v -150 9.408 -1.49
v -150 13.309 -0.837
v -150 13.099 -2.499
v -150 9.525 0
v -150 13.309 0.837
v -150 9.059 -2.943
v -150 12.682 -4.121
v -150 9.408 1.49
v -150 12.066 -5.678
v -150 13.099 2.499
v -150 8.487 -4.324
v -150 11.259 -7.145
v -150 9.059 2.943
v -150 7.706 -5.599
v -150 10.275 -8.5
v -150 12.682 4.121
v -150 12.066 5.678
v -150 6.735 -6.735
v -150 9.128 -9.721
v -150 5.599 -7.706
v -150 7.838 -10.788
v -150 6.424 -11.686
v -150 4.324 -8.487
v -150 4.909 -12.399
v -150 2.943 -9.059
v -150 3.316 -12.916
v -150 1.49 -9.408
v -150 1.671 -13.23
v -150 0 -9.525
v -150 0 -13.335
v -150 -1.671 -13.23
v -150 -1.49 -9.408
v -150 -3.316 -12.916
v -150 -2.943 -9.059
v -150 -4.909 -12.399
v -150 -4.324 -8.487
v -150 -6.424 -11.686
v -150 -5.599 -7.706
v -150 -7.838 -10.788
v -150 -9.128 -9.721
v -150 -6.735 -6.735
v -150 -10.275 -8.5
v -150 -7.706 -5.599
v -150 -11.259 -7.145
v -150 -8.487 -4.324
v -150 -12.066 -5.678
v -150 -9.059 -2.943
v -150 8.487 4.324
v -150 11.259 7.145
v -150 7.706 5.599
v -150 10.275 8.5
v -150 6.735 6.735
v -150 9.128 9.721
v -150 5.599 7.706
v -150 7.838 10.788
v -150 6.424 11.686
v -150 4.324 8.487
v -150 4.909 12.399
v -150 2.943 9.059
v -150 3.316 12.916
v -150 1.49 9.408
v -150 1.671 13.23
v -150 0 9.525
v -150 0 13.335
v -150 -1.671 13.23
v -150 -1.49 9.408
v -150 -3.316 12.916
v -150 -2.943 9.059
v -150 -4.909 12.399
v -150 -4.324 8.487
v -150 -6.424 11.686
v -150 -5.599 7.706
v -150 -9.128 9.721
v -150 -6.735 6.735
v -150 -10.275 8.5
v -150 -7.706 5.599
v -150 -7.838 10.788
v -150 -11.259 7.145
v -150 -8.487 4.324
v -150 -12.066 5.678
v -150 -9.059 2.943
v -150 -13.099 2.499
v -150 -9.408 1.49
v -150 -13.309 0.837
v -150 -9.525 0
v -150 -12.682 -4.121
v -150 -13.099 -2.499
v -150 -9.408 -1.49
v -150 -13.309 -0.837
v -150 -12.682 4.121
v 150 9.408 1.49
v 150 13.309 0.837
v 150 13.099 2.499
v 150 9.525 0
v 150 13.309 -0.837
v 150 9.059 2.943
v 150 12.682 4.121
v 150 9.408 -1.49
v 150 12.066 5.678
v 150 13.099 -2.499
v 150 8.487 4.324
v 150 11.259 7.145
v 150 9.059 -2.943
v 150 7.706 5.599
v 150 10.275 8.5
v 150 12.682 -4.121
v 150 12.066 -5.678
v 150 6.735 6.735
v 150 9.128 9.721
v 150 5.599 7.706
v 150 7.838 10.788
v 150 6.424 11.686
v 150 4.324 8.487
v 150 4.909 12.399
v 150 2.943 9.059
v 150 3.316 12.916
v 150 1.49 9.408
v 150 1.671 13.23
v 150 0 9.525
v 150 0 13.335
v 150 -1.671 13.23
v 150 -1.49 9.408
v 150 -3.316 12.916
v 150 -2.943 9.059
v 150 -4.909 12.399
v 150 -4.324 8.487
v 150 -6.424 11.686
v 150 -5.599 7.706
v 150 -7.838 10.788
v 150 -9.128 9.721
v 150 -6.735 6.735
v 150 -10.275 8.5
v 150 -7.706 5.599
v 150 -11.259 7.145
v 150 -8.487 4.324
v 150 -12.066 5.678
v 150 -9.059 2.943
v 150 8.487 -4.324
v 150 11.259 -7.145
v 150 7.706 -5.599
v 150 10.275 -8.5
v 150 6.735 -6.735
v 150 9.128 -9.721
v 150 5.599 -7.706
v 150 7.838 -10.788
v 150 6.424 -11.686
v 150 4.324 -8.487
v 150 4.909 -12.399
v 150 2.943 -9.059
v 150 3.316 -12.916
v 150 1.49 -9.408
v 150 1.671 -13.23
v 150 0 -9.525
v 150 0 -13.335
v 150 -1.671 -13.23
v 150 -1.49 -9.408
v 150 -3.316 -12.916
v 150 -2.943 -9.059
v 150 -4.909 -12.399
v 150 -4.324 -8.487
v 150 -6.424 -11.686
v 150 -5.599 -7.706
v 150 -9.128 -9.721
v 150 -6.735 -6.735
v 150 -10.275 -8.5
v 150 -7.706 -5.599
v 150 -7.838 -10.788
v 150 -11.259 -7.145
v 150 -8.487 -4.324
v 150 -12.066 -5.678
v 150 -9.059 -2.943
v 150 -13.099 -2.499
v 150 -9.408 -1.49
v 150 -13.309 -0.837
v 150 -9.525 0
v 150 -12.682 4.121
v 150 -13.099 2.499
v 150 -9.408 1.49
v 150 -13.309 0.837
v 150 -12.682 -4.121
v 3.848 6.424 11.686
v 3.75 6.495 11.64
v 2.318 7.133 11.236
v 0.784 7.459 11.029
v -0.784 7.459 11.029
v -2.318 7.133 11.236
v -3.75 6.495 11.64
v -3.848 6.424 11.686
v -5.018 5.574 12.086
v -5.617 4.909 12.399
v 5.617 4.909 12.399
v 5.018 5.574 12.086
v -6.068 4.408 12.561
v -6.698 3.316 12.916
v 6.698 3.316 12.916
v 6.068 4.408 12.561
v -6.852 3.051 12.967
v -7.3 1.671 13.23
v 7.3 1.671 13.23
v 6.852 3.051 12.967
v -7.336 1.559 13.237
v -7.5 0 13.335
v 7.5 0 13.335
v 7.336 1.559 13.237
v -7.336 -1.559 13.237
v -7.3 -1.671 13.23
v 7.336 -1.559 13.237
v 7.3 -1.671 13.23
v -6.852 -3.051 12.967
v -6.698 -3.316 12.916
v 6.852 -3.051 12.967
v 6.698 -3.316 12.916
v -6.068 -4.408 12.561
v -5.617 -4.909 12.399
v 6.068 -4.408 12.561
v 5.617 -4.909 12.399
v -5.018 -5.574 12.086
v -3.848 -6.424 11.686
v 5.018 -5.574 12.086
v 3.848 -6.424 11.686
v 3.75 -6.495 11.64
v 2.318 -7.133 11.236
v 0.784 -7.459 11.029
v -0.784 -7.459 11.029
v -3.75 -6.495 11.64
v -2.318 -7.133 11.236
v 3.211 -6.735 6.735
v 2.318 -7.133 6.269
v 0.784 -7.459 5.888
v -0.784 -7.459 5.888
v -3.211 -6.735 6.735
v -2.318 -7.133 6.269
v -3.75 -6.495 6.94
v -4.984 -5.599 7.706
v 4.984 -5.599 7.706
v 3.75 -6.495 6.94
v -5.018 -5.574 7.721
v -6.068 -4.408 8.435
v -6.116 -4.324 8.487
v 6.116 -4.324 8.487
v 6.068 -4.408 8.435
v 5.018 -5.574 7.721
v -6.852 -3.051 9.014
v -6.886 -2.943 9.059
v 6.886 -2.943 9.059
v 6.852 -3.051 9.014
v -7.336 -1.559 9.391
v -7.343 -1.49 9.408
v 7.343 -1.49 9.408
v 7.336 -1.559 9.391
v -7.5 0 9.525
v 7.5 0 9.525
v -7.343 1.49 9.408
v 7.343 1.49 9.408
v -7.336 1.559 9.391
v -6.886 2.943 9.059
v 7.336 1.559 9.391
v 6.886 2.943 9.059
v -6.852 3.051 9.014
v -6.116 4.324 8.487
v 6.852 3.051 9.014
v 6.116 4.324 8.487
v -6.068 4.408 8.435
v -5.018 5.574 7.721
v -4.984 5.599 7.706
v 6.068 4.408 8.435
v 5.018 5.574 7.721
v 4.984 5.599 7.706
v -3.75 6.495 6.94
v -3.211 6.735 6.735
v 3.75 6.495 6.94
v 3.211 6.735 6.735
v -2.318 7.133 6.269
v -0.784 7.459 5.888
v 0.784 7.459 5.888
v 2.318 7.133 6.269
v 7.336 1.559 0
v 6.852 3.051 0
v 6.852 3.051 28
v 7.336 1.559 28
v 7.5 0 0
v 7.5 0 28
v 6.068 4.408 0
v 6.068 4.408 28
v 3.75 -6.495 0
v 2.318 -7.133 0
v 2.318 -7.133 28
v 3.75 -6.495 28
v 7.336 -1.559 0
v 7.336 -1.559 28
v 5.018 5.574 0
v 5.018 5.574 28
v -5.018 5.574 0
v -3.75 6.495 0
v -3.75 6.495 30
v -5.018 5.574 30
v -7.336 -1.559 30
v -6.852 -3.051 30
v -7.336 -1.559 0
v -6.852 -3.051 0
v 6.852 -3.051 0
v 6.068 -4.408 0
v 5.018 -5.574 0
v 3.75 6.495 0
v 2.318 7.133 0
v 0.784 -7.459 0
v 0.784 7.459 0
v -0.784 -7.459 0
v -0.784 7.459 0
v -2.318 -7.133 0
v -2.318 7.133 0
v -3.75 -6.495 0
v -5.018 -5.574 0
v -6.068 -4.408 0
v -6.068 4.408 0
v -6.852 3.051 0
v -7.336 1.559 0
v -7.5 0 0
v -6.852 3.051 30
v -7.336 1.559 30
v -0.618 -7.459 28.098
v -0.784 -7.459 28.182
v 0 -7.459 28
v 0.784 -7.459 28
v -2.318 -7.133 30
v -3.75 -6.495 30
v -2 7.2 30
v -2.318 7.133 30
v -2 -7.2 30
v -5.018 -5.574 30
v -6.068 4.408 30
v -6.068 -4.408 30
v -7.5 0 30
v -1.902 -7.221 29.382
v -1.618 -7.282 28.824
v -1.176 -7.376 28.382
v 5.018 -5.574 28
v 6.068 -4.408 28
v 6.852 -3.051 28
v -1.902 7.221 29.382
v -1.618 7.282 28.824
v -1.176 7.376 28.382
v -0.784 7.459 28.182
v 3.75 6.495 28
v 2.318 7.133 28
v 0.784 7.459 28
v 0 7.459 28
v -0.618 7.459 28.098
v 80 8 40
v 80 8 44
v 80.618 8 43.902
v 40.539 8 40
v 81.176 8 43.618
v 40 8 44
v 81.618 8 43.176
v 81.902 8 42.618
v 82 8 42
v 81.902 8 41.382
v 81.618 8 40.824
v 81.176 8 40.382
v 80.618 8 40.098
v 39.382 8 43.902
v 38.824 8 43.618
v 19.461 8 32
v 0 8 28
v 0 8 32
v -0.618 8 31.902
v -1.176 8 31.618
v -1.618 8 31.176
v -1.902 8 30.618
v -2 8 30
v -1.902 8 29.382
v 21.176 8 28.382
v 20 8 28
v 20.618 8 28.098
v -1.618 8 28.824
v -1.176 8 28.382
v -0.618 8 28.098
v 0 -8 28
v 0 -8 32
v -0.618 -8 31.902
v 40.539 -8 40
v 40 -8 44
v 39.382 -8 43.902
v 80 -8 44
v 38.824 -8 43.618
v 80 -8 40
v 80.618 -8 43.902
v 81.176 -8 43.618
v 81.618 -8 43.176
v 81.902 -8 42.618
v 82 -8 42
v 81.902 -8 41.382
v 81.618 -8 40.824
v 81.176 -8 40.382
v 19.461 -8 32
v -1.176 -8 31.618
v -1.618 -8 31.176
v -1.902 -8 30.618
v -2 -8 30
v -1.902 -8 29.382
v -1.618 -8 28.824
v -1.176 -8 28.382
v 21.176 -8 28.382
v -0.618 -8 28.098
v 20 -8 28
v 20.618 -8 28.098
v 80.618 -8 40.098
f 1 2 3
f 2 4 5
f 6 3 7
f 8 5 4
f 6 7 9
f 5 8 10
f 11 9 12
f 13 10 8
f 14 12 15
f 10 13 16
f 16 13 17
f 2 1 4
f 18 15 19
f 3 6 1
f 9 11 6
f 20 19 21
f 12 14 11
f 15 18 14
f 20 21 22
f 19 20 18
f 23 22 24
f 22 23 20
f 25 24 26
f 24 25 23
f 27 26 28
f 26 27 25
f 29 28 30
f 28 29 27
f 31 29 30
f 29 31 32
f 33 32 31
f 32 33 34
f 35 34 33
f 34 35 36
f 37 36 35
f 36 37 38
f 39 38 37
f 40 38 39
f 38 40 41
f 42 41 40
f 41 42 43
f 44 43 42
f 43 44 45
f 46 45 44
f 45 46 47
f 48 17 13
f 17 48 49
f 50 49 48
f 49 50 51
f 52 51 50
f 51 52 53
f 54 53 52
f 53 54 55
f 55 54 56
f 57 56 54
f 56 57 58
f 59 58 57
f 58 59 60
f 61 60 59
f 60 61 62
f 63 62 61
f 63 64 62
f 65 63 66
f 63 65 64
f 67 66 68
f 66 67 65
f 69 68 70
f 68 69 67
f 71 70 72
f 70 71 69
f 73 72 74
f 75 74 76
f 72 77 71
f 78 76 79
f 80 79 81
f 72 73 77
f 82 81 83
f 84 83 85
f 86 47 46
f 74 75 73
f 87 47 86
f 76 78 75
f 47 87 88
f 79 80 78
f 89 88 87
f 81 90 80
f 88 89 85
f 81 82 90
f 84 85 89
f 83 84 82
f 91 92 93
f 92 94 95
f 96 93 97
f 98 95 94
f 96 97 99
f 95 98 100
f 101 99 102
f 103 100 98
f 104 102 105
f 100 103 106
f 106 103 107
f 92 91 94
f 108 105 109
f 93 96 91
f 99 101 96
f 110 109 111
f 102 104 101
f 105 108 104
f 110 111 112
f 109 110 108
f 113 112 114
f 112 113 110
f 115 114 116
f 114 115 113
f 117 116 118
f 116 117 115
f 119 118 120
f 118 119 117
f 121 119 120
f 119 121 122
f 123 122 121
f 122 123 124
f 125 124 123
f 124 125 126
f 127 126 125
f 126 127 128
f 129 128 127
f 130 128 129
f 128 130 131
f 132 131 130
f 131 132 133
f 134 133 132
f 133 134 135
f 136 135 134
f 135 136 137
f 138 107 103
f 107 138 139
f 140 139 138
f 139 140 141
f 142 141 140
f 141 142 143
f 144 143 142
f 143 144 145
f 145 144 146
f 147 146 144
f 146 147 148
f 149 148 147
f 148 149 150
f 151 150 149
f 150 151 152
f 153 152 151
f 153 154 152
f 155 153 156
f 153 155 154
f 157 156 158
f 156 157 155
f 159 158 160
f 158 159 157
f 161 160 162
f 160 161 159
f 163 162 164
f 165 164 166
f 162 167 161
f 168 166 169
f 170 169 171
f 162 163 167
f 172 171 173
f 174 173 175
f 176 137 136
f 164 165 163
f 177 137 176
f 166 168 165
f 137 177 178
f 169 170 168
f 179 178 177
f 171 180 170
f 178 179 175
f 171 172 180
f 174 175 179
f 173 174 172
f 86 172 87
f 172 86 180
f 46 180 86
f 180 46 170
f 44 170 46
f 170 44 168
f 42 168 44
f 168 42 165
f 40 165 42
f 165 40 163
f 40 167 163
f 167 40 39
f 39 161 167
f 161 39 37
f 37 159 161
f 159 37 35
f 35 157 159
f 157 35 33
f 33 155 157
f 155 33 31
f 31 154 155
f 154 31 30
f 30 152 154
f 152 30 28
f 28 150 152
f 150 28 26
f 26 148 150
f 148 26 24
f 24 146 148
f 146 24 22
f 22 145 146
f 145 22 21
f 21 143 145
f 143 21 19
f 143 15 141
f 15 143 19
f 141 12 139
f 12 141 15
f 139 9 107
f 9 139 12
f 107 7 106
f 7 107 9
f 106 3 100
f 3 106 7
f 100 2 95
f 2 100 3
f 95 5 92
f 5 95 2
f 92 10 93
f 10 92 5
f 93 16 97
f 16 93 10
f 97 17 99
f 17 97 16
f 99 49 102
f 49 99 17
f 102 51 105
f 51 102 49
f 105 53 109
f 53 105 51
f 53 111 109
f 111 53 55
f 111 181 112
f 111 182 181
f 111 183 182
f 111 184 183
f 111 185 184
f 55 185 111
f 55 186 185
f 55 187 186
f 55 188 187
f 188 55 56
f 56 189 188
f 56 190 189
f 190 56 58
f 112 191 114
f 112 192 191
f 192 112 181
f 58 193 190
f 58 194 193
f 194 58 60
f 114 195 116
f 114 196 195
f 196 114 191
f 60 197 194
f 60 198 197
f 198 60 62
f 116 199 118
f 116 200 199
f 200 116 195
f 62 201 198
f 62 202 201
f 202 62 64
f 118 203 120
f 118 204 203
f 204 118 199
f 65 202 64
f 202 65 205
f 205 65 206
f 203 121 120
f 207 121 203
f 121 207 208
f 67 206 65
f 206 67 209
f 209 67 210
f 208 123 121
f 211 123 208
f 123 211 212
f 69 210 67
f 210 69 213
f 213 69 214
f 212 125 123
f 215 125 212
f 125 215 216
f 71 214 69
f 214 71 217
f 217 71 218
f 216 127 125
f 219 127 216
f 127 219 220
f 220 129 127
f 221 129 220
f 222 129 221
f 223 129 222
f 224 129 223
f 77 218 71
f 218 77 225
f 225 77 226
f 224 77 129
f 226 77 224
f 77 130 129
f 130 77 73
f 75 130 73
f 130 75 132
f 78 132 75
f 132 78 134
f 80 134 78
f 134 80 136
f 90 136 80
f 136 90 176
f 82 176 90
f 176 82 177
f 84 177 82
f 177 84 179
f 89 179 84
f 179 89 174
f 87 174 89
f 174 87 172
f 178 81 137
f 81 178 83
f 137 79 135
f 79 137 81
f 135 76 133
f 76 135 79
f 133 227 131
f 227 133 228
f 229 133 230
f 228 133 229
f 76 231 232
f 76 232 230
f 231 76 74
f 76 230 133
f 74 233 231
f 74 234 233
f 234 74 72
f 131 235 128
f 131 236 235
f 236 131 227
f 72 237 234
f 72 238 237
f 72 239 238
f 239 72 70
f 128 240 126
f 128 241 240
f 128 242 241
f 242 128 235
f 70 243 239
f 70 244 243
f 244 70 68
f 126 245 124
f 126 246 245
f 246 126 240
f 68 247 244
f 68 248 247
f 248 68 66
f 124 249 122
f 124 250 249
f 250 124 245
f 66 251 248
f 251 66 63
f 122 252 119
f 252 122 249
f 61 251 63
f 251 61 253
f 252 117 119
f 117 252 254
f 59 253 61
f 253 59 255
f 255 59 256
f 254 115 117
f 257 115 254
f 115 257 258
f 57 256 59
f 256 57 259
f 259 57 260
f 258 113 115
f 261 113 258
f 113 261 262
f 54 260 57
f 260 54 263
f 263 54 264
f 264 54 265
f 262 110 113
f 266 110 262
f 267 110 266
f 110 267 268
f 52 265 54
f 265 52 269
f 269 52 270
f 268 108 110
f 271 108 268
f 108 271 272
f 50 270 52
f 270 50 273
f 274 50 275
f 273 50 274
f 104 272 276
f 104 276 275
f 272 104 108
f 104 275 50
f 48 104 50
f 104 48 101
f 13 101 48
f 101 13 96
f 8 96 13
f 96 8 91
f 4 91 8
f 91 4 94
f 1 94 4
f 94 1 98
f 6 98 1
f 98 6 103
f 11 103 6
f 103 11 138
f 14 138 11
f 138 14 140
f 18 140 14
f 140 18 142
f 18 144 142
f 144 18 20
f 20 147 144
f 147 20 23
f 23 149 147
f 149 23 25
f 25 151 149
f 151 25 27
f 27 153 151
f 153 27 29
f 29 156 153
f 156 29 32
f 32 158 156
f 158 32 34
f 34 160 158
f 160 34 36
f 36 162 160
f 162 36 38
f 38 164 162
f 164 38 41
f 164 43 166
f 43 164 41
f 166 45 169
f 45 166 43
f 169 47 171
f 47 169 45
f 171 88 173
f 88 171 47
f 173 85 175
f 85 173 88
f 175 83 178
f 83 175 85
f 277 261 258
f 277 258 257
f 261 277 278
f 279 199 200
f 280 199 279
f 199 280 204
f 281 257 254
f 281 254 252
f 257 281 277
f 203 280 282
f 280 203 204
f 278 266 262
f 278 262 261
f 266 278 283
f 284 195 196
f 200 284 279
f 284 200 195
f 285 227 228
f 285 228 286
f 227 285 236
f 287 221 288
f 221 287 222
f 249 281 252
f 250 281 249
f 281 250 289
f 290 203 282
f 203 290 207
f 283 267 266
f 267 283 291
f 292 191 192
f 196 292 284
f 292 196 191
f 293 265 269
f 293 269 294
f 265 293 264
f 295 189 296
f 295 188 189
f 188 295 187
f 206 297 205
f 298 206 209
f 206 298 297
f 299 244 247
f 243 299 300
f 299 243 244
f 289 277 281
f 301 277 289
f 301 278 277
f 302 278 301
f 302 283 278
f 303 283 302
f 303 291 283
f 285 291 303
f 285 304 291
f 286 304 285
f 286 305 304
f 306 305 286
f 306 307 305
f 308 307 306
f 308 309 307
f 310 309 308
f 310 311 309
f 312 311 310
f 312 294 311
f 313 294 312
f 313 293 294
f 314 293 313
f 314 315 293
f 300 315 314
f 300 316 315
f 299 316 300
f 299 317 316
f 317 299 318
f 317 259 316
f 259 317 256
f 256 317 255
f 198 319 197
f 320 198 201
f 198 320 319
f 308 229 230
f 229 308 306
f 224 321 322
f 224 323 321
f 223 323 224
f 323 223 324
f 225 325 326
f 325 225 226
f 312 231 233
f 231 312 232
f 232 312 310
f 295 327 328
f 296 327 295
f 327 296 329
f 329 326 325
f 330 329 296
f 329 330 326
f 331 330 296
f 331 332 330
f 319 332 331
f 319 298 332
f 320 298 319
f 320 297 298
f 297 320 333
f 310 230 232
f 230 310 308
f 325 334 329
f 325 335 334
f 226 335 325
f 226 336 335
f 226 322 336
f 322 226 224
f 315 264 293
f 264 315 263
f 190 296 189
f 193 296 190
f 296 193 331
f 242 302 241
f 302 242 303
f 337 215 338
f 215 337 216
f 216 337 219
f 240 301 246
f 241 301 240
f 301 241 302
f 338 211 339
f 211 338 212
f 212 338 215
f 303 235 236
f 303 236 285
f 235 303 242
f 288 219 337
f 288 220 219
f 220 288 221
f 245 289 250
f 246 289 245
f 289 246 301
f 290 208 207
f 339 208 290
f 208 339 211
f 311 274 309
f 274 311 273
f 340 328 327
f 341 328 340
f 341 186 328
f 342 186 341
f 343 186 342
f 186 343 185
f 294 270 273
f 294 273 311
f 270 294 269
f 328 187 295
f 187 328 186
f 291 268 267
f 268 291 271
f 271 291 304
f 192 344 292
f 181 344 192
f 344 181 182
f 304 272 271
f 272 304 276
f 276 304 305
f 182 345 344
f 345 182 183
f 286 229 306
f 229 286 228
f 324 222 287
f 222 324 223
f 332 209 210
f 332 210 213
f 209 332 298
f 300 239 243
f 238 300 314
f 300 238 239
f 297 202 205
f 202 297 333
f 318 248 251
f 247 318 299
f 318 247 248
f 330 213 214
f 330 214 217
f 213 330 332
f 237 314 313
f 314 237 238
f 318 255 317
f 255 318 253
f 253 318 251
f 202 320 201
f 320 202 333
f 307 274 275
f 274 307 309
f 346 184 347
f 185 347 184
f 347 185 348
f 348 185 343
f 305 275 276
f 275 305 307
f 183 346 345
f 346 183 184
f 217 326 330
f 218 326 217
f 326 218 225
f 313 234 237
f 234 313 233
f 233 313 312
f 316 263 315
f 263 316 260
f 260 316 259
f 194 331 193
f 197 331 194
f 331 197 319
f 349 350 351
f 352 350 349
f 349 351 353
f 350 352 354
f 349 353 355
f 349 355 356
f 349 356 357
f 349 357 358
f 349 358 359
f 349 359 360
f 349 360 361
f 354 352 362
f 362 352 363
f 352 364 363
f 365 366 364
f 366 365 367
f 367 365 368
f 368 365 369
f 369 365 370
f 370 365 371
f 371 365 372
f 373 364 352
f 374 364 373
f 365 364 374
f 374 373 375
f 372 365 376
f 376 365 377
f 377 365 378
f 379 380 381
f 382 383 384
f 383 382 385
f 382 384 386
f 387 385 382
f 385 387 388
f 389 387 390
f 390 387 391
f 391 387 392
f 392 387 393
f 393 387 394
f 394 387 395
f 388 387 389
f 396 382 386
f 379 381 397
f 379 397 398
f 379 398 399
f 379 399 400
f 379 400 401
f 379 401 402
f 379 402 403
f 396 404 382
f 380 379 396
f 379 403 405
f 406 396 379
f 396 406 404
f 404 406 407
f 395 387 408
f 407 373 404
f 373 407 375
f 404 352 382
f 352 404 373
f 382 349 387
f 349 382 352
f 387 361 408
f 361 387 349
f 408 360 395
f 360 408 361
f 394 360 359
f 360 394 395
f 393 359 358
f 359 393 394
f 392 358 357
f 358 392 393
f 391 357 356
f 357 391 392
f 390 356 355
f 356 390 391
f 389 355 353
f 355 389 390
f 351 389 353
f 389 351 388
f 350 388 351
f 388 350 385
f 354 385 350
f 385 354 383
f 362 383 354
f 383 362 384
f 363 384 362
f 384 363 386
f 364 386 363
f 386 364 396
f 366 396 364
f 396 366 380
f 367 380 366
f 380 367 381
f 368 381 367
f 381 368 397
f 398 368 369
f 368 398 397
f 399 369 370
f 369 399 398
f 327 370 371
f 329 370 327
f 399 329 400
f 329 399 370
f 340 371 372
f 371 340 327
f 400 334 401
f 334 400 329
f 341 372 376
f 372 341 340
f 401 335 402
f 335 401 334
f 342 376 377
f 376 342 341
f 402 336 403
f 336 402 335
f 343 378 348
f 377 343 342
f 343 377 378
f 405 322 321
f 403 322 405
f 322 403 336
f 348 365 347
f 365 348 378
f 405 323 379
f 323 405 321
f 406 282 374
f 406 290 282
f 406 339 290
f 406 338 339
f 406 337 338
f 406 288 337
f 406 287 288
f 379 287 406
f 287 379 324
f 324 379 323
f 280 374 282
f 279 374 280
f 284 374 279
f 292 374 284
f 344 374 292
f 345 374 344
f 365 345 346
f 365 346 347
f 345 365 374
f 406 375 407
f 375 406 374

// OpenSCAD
union() {
translate([-150,0]) rotate([0,90]) linear_extrude(300) difference() { circle(d=25.4*1.05,$fn=50); circle(d=25.4*.75,$fn=40); }
cylinder(d=15,h=30,$fn=30);
translate([0,0,30]) rotate([90,0]) translate([0,0,-8]) linear_extrude(16) hullkids() {
  circle(d=4,$fn=20);
  translate([20,0]) circle(d=4,$fn=20);
  translate([40,12]) circle(d=4,$fn=20);
  translate([80,12]) circle(d=4,$fn=20);
}
}

module hullkids() {
  for(a=[0:$children-2])
  {
    hull() {
      children(a);
      children(a+1);
    }
  }
}
